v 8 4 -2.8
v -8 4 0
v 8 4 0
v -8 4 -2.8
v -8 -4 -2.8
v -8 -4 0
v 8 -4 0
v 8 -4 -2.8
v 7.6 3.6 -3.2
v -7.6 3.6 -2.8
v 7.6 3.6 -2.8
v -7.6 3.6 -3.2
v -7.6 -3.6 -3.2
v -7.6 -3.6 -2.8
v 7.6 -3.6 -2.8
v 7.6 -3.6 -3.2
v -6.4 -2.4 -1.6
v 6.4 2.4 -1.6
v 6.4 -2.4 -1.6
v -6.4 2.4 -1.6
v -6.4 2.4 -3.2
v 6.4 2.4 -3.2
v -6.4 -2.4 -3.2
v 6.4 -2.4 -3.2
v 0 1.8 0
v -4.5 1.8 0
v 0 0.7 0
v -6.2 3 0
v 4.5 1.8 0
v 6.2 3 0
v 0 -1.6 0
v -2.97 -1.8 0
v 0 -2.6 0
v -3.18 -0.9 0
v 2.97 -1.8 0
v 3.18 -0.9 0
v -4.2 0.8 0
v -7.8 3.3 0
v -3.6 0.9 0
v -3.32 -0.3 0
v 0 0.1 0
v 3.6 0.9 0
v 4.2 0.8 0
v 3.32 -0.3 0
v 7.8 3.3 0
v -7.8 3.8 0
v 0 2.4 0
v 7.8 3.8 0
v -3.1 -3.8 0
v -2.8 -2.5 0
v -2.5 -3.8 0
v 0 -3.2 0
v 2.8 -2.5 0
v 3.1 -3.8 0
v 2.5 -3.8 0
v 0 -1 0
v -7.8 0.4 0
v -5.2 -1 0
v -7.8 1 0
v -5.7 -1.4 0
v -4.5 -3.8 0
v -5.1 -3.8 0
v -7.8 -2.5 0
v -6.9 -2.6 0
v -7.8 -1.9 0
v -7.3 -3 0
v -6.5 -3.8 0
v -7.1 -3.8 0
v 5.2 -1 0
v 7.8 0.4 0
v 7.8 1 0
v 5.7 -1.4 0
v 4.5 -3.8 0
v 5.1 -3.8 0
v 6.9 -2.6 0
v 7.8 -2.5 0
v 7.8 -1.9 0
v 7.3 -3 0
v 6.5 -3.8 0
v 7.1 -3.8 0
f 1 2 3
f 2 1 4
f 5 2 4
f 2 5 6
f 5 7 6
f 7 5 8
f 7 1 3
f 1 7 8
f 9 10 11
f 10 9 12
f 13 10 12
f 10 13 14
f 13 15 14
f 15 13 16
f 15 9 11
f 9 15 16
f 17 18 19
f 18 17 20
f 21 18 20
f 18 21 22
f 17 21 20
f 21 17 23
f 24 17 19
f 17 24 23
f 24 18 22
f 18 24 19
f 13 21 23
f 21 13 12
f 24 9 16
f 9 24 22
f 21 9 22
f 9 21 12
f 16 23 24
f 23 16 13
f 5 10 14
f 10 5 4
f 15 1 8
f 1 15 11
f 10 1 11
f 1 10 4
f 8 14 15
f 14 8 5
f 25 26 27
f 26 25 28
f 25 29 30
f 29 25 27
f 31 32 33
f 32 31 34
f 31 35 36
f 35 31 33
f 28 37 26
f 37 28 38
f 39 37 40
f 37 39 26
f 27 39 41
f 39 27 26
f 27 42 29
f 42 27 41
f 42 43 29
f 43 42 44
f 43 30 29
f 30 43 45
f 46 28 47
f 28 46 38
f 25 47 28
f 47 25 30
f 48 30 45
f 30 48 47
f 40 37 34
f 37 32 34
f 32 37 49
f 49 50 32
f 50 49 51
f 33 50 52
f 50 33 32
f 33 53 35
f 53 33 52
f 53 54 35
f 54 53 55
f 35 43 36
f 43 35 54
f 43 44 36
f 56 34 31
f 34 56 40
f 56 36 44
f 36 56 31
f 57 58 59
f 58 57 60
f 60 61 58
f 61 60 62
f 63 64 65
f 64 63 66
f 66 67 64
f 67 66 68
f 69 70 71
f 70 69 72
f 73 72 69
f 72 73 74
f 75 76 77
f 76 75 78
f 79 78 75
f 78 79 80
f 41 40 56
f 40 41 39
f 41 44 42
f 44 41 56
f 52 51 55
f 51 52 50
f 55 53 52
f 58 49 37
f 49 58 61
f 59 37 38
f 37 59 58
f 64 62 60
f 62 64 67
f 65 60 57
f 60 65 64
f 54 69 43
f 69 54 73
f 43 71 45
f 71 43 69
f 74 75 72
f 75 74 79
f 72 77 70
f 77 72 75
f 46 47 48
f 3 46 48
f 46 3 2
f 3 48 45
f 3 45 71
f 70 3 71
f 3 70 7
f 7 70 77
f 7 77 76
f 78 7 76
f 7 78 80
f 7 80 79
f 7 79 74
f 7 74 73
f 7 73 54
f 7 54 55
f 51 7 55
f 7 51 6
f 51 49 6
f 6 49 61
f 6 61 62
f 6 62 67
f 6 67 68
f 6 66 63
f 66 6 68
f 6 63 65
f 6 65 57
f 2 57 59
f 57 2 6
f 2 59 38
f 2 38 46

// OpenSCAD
// file: ../p/box5.scad
use <../lib.scad>
function ldraw_lib__box5() = [
// 0 Box with 5 Faces and All Edges
// 0 Name: box5.dat
// 0 Author: James Jessiman
// 0 !LDRAW_ORG Primitive UPDATE 2012-01
// 0 !LICENSE Licensed under CC BY 2.0 and CC BY 4.0 : see CAreadme.txt
// 
// 0 BFC CERTIFY CCW
  [0,"BFC","CERTIFY"],
  [0,"BFC","CCW"],
// 
// 0 !HISTORY 2002-04-03 [sbliss] Modified for BFC compliance
// 0 !HISTORY 2002-04-25 [PTadmin] Official Update 2002-02
// 0 !HISTORY 2007-06-24 [PTadmin] Header formatted for Contributor Agreement
// 0 !HISTORY 2008-07-01 [PTadmin] Official Update 2008-01
// 0 !HISTORY 2012-02-16 [Philo] Changed to CCW
// 0 !HISTORY 2012-03-30 [PTadmin] Official Update 2012-01
// 
// 
// 2 24 1 1 1 -1 1 1
  [2,24,1,1,1,-1,1,1],
// 2 24 -1 1 1 -1 1 -1
  [2,24,-1,1,1,-1,1,-1],
// 2 24 -1 1 -1 1 1 -1
  [2,24,-1,1,-1,1,1,-1],
// 2 24 1 1 -1 1 1 1
  [2,24,1,1,-1,1,1,1],
// 2 24 1 0 1 -1 0 1
  [2,24,1,0,1,-1,0,1],
// 2 24 -1 0 1 -1 0 -1
  [2,24,-1,0,1,-1,0,-1],
// 2 24 -1 0 -1 1 0 -1
  [2,24,-1,0,-1,1,0,-1],
// 2 24 1 0 -1 1 0 1
  [2,24,1,0,-1,1,0,1],
// 2 24 1 0 1 1 1 1
  [2,24,1,0,1,1,1,1],
// 2 24 -1 0 1 -1 1 1
  [2,24,-1,0,1,-1,1,1],
// 2 24 1 0 -1 1 1 -1
  [2,24,1,0,-1,1,1,-1],
// 2 24 -1 0 -1 -1 1 -1
  [2,24,-1,0,-1,-1,1,-1],
// 4 16 -1 1 1 1 1 1 1 1 -1 -1 1 -1
  [4,16,-1,1,1,1,1,1,1,1,-1,-1,1,-1],
// 4 16 -1 1 1 -1 0 1 1 0 1 1 1 1
  [4,16,-1,1,1,-1,0,1,1,0,1,1,1,1],
// 4 16 -1 1 -1 -1 0 -1 -1 0 1 -1 1 1
  [4,16,-1,1,-1,-1,0,-1,-1,0,1,-1,1,1],
// 4 16 1 1 -1 1 0 -1 -1 0 -1 -1 1 -1
  [4,16,1,1,-1,1,0,-1,-1,0,-1,-1,1,-1],
// 4 16 1 1 1 1 0 1 1 0 -1 1 1 -1
  [4,16,1,1,1,1,0,1,1,0,-1,1,1,-1],
];
module ldraw_lib__box5(step=0, col=false, unit=2/5, alt=false, line=0.2, solid=!$preview)
    makepoly(ldraw_lib__box5(), step=step, col=col, unit=unit, alt=alt, line=line, solid=solid);
ldraw_lib__box5(line=0.2);
// file: ../p/box4.scad
use <../lib.scad>
function ldraw_lib__box4() = [
// 0 Box with 4 Faces (2 Parallel Pairs) and All Edges
// 0 Name: box4.dat
// 0 Author: James Jessiman
// 0 !LDRAW_ORG Primitive UPDATE 2012-01
// 0 !LICENSE Licensed under CC BY 2.0 and CC BY 4.0 : see CAreadme.txt
// 
// 0 BFC CERTIFY CCW
  [0,"BFC","CERTIFY"],
  [0,"BFC","CCW"],
// 
// 0 !HISTORY 2002-04-03 [sbliss] Modified for BFC compliance
// 0 !HISTORY 2002-04-25 [PTadmin] Official Update 2002-02
// 0 !HISTORY 2007-06-24 [PTadmin] Header formatted for Contributor Agreement
// 0 !HISTORY 2008-07-01 [PTadmin] Official Update 2008-01
// 0 !HISTORY 2012-02-16 [Philo] Changed to CCW
// 0 !HISTORY 2012-03-30 [PTadmin] Official Update 2012-01
// 
// 
// 2 24 1 1 1 -1 1 1
  [2,24,1,1,1,-1,1,1],
// 2 24 -1 1 1 -1 1 -1
  [2,24,-1,1,1,-1,1,-1],
// 2 24 -1 1 -1 1 1 -1
  [2,24,-1,1,-1,1,1,-1],
// 2 24 1 1 -1 1 1 1
  [2,24,1,1,-1,1,1,1],
// 2 24 1 0 1 -1 0 1
  [2,24,1,0,1,-1,0,1],
// 2 24 -1 0 1 -1 0 -1
  [2,24,-1,0,1,-1,0,-1],
// 2 24 -1 0 -1 1 0 -1
  [2,24,-1,0,-1,1,0,-1],
// 2 24 1 0 -1 1 0 1
  [2,24,1,0,-1,1,0,1],
// 2 24 1 0 1 1 1 1
  [2,24,1,0,1,1,1,1],
// 2 24 -1 0 1 -1 1 1
  [2,24,-1,0,1,-1,1,1],
// 2 24 1 0 -1 1 1 -1
  [2,24,1,0,-1,1,1,-1],
// 2 24 -1 0 -1 -1 1 -1
  [2,24,-1,0,-1,-1,1,-1],
// 4 16 -1 1 1 -1 0 1 1 0 1 1 1 1
  [4,16,-1,1,1,-1,0,1,1,0,1,1,1,1],
// 4 16 -1 1 -1 -1 0 -1 -1 0 1 -1 1 1
  [4,16,-1,1,-1,-1,0,-1,-1,0,1,-1,1,1],
// 4 16 1 1 -1 1 0 -1 -1 0 -1 -1 1 -1
  [4,16,1,1,-1,1,0,-1,-1,0,-1,-1,1,-1],
// 4 16 1 1 1 1 0 1 1 0 -1 1 1 -1
  [4,16,1,1,1,1,0,1,1,0,-1,1,1,-1],
];
module ldraw_lib__box4(step=0, col=false, unit=2/5, alt=false, line=0.2, solid=!$preview)
    makepoly(ldraw_lib__box4(), step=step, col=col, unit=unit, alt=alt, line=line, solid=solid);
ldraw_lib__box4(line=0.2);
// file: s/3069bs01.scad
use <../../lib.scad>
use <../../p/box4.scad>
use <../../p/box5.scad>
function ldraw_lib__s__3069bs01() = [
// 0 ~Tile  1 x  2 with Groove without Top Face
// 0 Name: s\3069bs01.dat
// 0 Author: Santeri Piippo [arezey]
// 0 !LDRAW_ORG Subpart UPDATE 2010-02
// 0 !LICENSE Licensed under CC BY 2.0 and CC BY 4.0 : see CAreadme.txt
// 
// 0 BFC CERTIFY CCW
  [0,"BFC","CERTIFY"],
  [0,"BFC","CCW"],
// 
// 0 !HISTORY 2010-07-05 [PTadmin] Official Update 2010-02
// 
// 
// 1 16 0 0 0 20 0 0 0 7 0 0 0 10 box4.dat
  [1,16,0,0,0,20,0,0,0,7,0,0,0,10, ldraw_lib__box4()],
// 1 16 0 7 0 19 0 0 0 1 0 0 0 9 box4.dat
  [1,16,0,7,0,19,0,0,0,1,0,0,0,9, ldraw_lib__box4()],
// 0 BFC INVERTNEXT
  [0,"BFC","INVERTNEXT"],
// 1 16 0 8 0 16 0 0 0 -4 0 0 0 6 box5.dat
  [1,16,0,8,0,16,0,0,0,-4,0,0,0,6, ldraw_lib__box5()],
// 4 16 -19 8 9 -16 8 6 -16 8 -6 -19 8 -9
  [4,16,-19,8,9,-16,8,6,-16,8,-6,-19,8,-9],
// 4 16 19 8 -9 16 8 -6 16 8 6 19 8 9
  [4,16,19,8,-9,16,8,-6,16,8,6,19,8,9],
// 4 16 19 8 9 16 8 6 -16 8 6 -19 8 9
  [4,16,19,8,9,16,8,6,-16,8,6,-19,8,9],
// 4 16 -19 8 -9 -16 8 -6 16 8 -6 19 8 -9
  [4,16,-19,8,-9,-16,8,-6,16,8,-6,19,8,-9],
// 4 16 -20 7 10 -19 7 9 -19 7 -9 -20 7 -10
  [4,16,-20,7,10,-19,7,9,-19,7,-9,-20,7,-10],
// 4 16 20 7 -10 19 7 -9 19 7 9 20 7 10
  [4,16,20,7,-10,19,7,-9,19,7,9,20,7,10],
// 4 16 20 7 10 19 7 9 -19 7 9 -20 7 10
  [4,16,20,7,10,19,7,9,-19,7,9,-20,7,10],
// 4 16 -20 7 -10 -19 7 -9 19 7 -9 20 7 -10
  [4,16,-20,7,-10,-19,7,-9,19,7,-9,20,7,-10],
// 0 //
];
module ldraw_lib__s__3069bs01(step=0, col=false, unit=2/5, alt=false, line=0.2, solid=!$preview)
    makepoly(ldraw_lib__s__3069bs01(), step=step, col=col, unit=unit, alt=alt, line=line, solid=solid);
ldraw_lib__s__3069bs01(line=0.2);
// main file
use <../lib.scad>
use <s/3069bs01.scad>
function ldraw_lib__3069bpzi() = [
// 0 Tile  1 x  2 with Metallic Silver and Dark Bluish Grey Lines Pattern
// 0 Name: 3069bpzi.dat
// 0 Author: Vincent Messenet [Cheenzo]
// 0 !LDRAW_ORG Part UPDATE 2022-01
// 0 !LICENSE Licensed under CC BY 2.0 and CC BY 4.0 : see CAreadme.txt
// 
// 0 BFC CERTIFY CCW
  [0,"BFC","CERTIFY"],
  [0,"BFC","CCW"],
// 
// 0 !KEYWORDS Brickheadz, BrickLink 3069bpb632, Cyborg, Justice League, Set 41601
// 
// 0 !HISTORY 2020-12-29 [PTadmin] Official Update 2020-03
// 0 !HISTORY 2021-01-16 [cwdee] Update description
// 0 !HISTORY 2022-01-14 [PTadmin] Official Update 2022-01
// 
// 
// 1 16 0 0 0 1 0 0 0 1 0 0 0 1 s\3069bs01.dat
  [1,16,0,0,0,1,0,0,0,1,0,0,0,1, ldraw_lib__s__3069bs01()],
// 
// 4 72 -15.5 0 7.5 -11.25 0 4.5 0 0 1.75 0 0 4.5
  [4,72,-15.5,0,7.5,-11.25,0,4.5,0,0,1.75,0,0,4.5],
// 4 72 0 0 4.5 0 0 1.75 11.25 0 4.5 15.5 0 7.5
  [4,72,0,0,4.5,0,0,1.75,11.25,0,4.5,15.5,0,7.5],
// 4 72 -7.95 0 -2.25 -7.425 0 -4.5 0 0 -6.5 0 0 -4
  [4,72,-7.95,0,-2.25,-7.425,0,-4.5,0,0,-6.5,0,0,-4],
// 4 72 7.95 0 -2.25 0 0 -4 0 0 -6.5 7.425 0 -4.5
  [4,72,7.95,0,-2.25,0,0,-4,0,0,-6.5,7.425,0,-4.5],
// 4 80 -11.25 0 4.5 -15.5 0 7.5 -19.5 0 8.25 -10.5 0 2
  [4,80,-11.25,0,4.5,-15.5,0,7.5,-19.5,0,8.25,-10.5,0,2],
// 4 80 -9 0 2.25 -11.25 0 4.5 -10.5 0 2 -8.3 0 -.75
  [4,80,-9,0,2.25,-11.25,0,4.5,-10.5,0,2,-8.3,0,-.75],
// 4 80 -11.25 0 4.5 -9 0 2.25 0 0 .25 0 0 1.75
  [4,80,-11.25,0,4.5,-9,0,2.25,0,0,.25,0,0,1.75],
// 4 80 0 0 .25 9 0 2.25 11.25 0 4.5 0 0 1.75
  [4,80,0,0,.25,9,0,2.25,11.25,0,4.5,0,0,1.75],
// 4 80 10.5 0 2 11.25 0 4.5 9 0 2.25 8.3 0 -.75
  [4,80,10.5,0,2,11.25,0,4.5,9,0,2.25,8.3,0,-.75],
// 4 80 15.5 0 7.5 11.25 0 4.5 10.5 0 2 19.5 0 8.25
  [4,80,15.5,0,7.5,11.25,0,4.5,10.5,0,2,19.5,0,8.25],
// 4 80 -19.5 0 9.5 -19.5 0 8.25 -15.5 0 7.5 0 0 6
  [4,80,-19.5,0,9.5,-19.5,0,8.25,-15.5,0,7.5,0,0,6],
// 3 80 0 0 4.5 0 0 6 -15.5 0 7.5
  [3,80,0,0,4.5,0,0,6,-15.5,0,7.5],
// 3 80 0 0 6 0 0 4.5 15.5 0 7.5
  [3,80,0,0,6,0,0,4.5,15.5,0,7.5],
// 4 80 0 0 6 15.5 0 7.5 19.5 0 8.25 19.5 0 9.5
  [4,80,0,0,6,15.5,0,7.5,19.5,0,8.25,19.5,0,9.5],
// 3 80 -8.3 0 -.75 -10.5 0 2 -7.95 0 -2.25
  [3,80,-8.3,0,-.75,-10.5,0,2,-7.95,0,-2.25],
// 4 80 -7.425 0 -4.5 -7.95 0 -2.25 -10.5 0 2 -7.75 0 -9.5
  [4,80,-7.425,0,-4.5,-7.95,0,-2.25,-10.5,0,2,-7.75,0,-9.5],
// 4 80 -6.25 0 -9.5 -7 0 -6.25 -7.425 0 -4.5 -7.75 0 -9.5
  [4,80,-6.25,0,-9.5,-7,0,-6.25,-7.425,0,-4.5,-7.75,0,-9.5],
// 4 80 -7.425 0 -4.5 -7 0 -6.25 0 0 -8 0 0 -6.5
  [4,80,-7.425,0,-4.5,-7,0,-6.25,0,0,-8,0,0,-6.5],
// 4 80 7.425 0 -4.5 0 0 -6.5 0 0 -8 7 0 -6.25
  [4,80,7.425,0,-4.5,0,0,-6.5,0,0,-8,7,0,-6.25],
// 4 80 7.425 0 -4.5 7 0 -6.25 6.25 0 -9.5 7.75 0 -9.5
  [4,80,7.425,0,-4.5,7,0,-6.25,6.25,0,-9.5,7.75,0,-9.5],
// 4 80 7.95 0 -2.25 7.425 0 -4.5 7.75 0 -9.5 10.5 0 2
  [4,80,7.95,0,-2.25,7.425,0,-4.5,7.75,0,-9.5,10.5,0,2],
// 3 80 10.5 0 2 8.3 0 -.75 7.95 0 -2.25
  [3,80,10.5,0,2,8.3,0,-.75,7.95,0,-2.25],
// 4 80 -8.3 0 -.75 -7.95 0 -2.25 0 0 -4 0 0 -2.5
  [4,80,-8.3,0,-.75,-7.95,0,-2.25,0,0,-4,0,0,-2.5],
// 4 80 8.3 0 -.75 0 0 -2.5 0 0 -4 7.95 0 -2.25
  [4,80,8.3,0,-.75,0,0,-2.5,0,0,-4,7.95,0,-2.25],
// 4 80 -19.5 0 2.5 -19.5 0 1 -14.25 0 -3.5 -13 0 -2.5
  [4,80,-19.5,0,2.5,-19.5,0,1,-14.25,0,-3.5,-13,0,-2.5],
// 4 80 -14.25 0 -3.5 -12.75 0 -9.5 -11.25 0 -9.5 -13 0 -2.5
  [4,80,-14.25,0,-3.5,-12.75,0,-9.5,-11.25,0,-9.5,-13,0,-2.5],
// 4 80 -18.25 0 -7.5 -17.25 0 -6.5 -19.5 0 -4.75 -19.5 0 -6.25
  [4,80,-18.25,0,-7.5,-17.25,0,-6.5,-19.5,0,-4.75,-19.5,0,-6.25],
// 4 80 -17.75 0 -9.5 -16.25 0 -9.5 -17.25 0 -6.5 -18.25 0 -7.5
  [4,80,-17.75,0,-9.5,-16.25,0,-9.5,-17.25,0,-6.5,-18.25,0,-7.5],
// 4 80 14.25 0 -3.5 19.5 0 1 19.5 0 2.5 13 0 -2.5
  [4,80,14.25,0,-3.5,19.5,0,1,19.5,0,2.5,13,0,-2.5],
// 4 80 12.75 0 -9.5 14.25 0 -3.5 13 0 -2.5 11.25 0 -9.5
  [4,80,12.75,0,-9.5,14.25,0,-3.5,13,0,-2.5,11.25,0,-9.5],
// 4 80 18.25 0 -7.5 19.5 0 -6.25 19.5 0 -4.75 17.25 0 -6.5
  [4,80,18.25,0,-7.5,19.5,0,-6.25,19.5,0,-4.75,17.25,0,-6.5],
// 4 80 16.25 0 -9.5 17.75 0 -9.5 18.25 0 -7.5 17.25 0 -6.5
  [4,80,16.25,0,-9.5,17.75,0,-9.5,18.25,0,-7.5,17.25,0,-6.5],
// 4 16 -9 0 2.25 -8.3 0 -.75 0 0 -2.5 0 0 .25
  [4,16,-9,0,2.25,-8.3,0,-.75,0,0,-2.5,0,0,.25],
// 4 16 8.3 0 -.75 9 0 2.25 0 0 .25 0 0 -2.5
  [4,16,8.3,0,-.75,9,0,2.25,0,0,.25,0,0,-2.5],
// 3 16 0 0 -8 -6.25 0 -9.5 6.25 0 -9.5
  [3,16,0,0,-8,-6.25,0,-9.5,6.25,0,-9.5],
// 3 16 -6.25 0 -9.5 0 0 -8 -7 0 -6.25
  [3,16,-6.25,0,-9.5,0,0,-8,-7,0,-6.25],
// 3 16 6.25 0 -9.5 7 0 -6.25 0 0 -8
  [3,16,6.25,0,-9.5,7,0,-6.25,0,0,-8],
// 4 16 -13 0 -2.5 -11.25 0 -9.5 -7.75 0 -9.5 -10.5 0 2
  [4,16,-13,0,-2.5,-11.25,0,-9.5,-7.75,0,-9.5,-10.5,0,2],
// 4 16 -10.5 0 2 -19.5 0 8.25 -19.5 0 2.5 -13 0 -2.5
  [4,16,-10.5,0,2,-19.5,0,8.25,-19.5,0,2.5,-13,0,-2.5],
// 4 16 -17.25 0 -6.5 -16.25 0 -9.5 -12.75 0 -9.5 -14.25 0 -3.5
  [4,16,-17.25,0,-6.5,-16.25,0,-9.5,-12.75,0,-9.5,-14.25,0,-3.5],
// 4 16 -19.5 0 -4.75 -17.25 0 -6.5 -14.25 0 -3.5 -19.5 0 1
  [4,16,-19.5,0,-4.75,-17.25,0,-6.5,-14.25,0,-3.5,-19.5,0,1],
// 4 16 11.25 0 -9.5 13 0 -2.5 10.5 0 2 7.75 0 -9.5
  [4,16,11.25,0,-9.5,13,0,-2.5,10.5,0,2,7.75,0,-9.5],
// 4 16 10.5 0 2 13 0 -2.5 19.5 0 2.5 19.5 0 8.25
  [4,16,10.5,0,2,13,0,-2.5,19.5,0,2.5,19.5,0,8.25],
// 4 16 12.75 0 -9.5 16.25 0 -9.5 17.25 0 -6.5 14.25 0 -3.5
  [4,16,12.75,0,-9.5,16.25,0,-9.5,17.25,0,-6.5,14.25,0,-3.5],
// 4 16 19.5 0 1 14.25 0 -3.5 17.25 0 -6.5 19.5 0 -4.75
  [4,16,19.5,0,1,14.25,0,-3.5,17.25,0,-6.5,19.5,0,-4.75],
// 3 16 -19.5 0 9.5 0 0 6 19.5 0 9.5
  [3,16,-19.5,0,9.5,0,0,6,19.5,0,9.5],
// 4 16 -20 0 10 -19.5 0 9.5 19.5 0 9.5 20 0 10
  [4,16,-20,0,10,-19.5,0,9.5,19.5,0,9.5,20,0,10],
// 3 16 20 0 10 19.5 0 9.5 19.5 0 8.25
  [3,16,20,0,10,19.5,0,9.5,19.5,0,8.25],
// 3 16 20 0 10 19.5 0 8.25 19.5 0 2.5
  [3,16,20,0,10,19.5,0,8.25,19.5,0,2.5],
// 4 16 20 0 10 19.5 0 2.5 19.5 0 1 20 0 -10
  [4,16,20,0,10,19.5,0,2.5,19.5,0,1,20,0,-10],
// 3 16 20 0 -10 19.5 0 1 19.5 0 -4.75
  [3,16,20,0,-10,19.5,0,1,19.5,0,-4.75],
// 3 16 20 0 -10 19.5 0 -4.75 19.5 0 -6.25
  [3,16,20,0,-10,19.5,0,-4.75,19.5,0,-6.25],
// 4 16 20 0 -10 19.5 0 -6.25 18.25 0 -7.5 17.75 0 -9.5
  [4,16,20,0,-10,19.5,0,-6.25,18.25,0,-7.5,17.75,0,-9.5],
// 3 16 20 0 -10 17.75 0 -9.5 16.25 0 -9.5
  [3,16,20,0,-10,17.75,0,-9.5,16.25,0,-9.5],
// 3 16 20 0 -10 16.25 0 -9.5 12.75 0 -9.5
  [3,16,20,0,-10,16.25,0,-9.5,12.75,0,-9.5],
// 3 16 20 0 -10 12.75 0 -9.5 11.25 0 -9.5
  [3,16,20,0,-10,12.75,0,-9.5,11.25,0,-9.5],
// 3 16 20 0 -10 11.25 0 -9.5 7.75 0 -9.5
  [3,16,20,0,-10,11.25,0,-9.5,7.75,0,-9.5],
// 3 16 20 0 -10 7.75 0 -9.5 6.25 0 -9.5
  [3,16,20,0,-10,7.75,0,-9.5,6.25,0,-9.5],
// 4 16 20 0 -10 6.25 0 -9.5 -6.25 0 -9.5 -20 0 -10
  [4,16,20,0,-10,6.25,0,-9.5,-6.25,0,-9.5,-20,0,-10],
// 3 16 -6.25 0 -9.5 -7.75 0 -9.5 -20 0 -10
  [3,16,-6.25,0,-9.5,-7.75,0,-9.5,-20,0,-10],
// 3 16 -20 0 -10 -7.75 0 -9.5 -11.25 0 -9.5
  [3,16,-20,0,-10,-7.75,0,-9.5,-11.25,0,-9.5],
// 3 16 -20 0 -10 -11.25 0 -9.5 -12.75 0 -9.5
  [3,16,-20,0,-10,-11.25,0,-9.5,-12.75,0,-9.5],
// 3 16 -20 0 -10 -12.75 0 -9.5 -16.25 0 -9.5
  [3,16,-20,0,-10,-12.75,0,-9.5,-16.25,0,-9.5],
// 3 16 -20 0 -10 -16.25 0 -9.5 -17.75 0 -9.5
  [3,16,-20,0,-10,-16.25,0,-9.5,-17.75,0,-9.5],
// 4 16 -20 0 -10 -17.75 0 -9.5 -18.25 0 -7.5 -19.5 0 -6.25
  [4,16,-20,0,-10,-17.75,0,-9.5,-18.25,0,-7.5,-19.5,0,-6.25],
// 3 16 -20 0 -10 -19.5 0 -6.25 -19.5 0 -4.75
  [3,16,-20,0,-10,-19.5,0,-6.25,-19.5,0,-4.75],
// 3 16 -20 0 -10 -19.5 0 -4.75 -19.5 0 1
  [3,16,-20,0,-10,-19.5,0,-4.75,-19.5,0,1],
// 4 16 -19.5 0 2.5 -20 0 10 -20 0 -10 -19.5 0 1
  [4,16,-19.5,0,2.5,-20,0,10,-20,0,-10,-19.5,0,1],
// 3 16 -20 0 10 -19.5 0 2.5 -19.5 0 8.25
  [3,16,-20,0,10,-19.5,0,2.5,-19.5,0,8.25],
// 3 16 -20 0 10 -19.5 0 8.25 -19.5 0 9.5
  [3,16,-20,0,10,-19.5,0,8.25,-19.5,0,9.5],
];
module ldraw_lib__3069bpzi(step=0, col=false, unit=2/5, alt=false, line=0.2, solid=!$preview)
    makepoly(ldraw_lib__3069bpzi(), step=step, col=col, unit=unit, alt=alt, line=line, solid=solid);
ldraw_lib__3069bpzi(line=0.2);
